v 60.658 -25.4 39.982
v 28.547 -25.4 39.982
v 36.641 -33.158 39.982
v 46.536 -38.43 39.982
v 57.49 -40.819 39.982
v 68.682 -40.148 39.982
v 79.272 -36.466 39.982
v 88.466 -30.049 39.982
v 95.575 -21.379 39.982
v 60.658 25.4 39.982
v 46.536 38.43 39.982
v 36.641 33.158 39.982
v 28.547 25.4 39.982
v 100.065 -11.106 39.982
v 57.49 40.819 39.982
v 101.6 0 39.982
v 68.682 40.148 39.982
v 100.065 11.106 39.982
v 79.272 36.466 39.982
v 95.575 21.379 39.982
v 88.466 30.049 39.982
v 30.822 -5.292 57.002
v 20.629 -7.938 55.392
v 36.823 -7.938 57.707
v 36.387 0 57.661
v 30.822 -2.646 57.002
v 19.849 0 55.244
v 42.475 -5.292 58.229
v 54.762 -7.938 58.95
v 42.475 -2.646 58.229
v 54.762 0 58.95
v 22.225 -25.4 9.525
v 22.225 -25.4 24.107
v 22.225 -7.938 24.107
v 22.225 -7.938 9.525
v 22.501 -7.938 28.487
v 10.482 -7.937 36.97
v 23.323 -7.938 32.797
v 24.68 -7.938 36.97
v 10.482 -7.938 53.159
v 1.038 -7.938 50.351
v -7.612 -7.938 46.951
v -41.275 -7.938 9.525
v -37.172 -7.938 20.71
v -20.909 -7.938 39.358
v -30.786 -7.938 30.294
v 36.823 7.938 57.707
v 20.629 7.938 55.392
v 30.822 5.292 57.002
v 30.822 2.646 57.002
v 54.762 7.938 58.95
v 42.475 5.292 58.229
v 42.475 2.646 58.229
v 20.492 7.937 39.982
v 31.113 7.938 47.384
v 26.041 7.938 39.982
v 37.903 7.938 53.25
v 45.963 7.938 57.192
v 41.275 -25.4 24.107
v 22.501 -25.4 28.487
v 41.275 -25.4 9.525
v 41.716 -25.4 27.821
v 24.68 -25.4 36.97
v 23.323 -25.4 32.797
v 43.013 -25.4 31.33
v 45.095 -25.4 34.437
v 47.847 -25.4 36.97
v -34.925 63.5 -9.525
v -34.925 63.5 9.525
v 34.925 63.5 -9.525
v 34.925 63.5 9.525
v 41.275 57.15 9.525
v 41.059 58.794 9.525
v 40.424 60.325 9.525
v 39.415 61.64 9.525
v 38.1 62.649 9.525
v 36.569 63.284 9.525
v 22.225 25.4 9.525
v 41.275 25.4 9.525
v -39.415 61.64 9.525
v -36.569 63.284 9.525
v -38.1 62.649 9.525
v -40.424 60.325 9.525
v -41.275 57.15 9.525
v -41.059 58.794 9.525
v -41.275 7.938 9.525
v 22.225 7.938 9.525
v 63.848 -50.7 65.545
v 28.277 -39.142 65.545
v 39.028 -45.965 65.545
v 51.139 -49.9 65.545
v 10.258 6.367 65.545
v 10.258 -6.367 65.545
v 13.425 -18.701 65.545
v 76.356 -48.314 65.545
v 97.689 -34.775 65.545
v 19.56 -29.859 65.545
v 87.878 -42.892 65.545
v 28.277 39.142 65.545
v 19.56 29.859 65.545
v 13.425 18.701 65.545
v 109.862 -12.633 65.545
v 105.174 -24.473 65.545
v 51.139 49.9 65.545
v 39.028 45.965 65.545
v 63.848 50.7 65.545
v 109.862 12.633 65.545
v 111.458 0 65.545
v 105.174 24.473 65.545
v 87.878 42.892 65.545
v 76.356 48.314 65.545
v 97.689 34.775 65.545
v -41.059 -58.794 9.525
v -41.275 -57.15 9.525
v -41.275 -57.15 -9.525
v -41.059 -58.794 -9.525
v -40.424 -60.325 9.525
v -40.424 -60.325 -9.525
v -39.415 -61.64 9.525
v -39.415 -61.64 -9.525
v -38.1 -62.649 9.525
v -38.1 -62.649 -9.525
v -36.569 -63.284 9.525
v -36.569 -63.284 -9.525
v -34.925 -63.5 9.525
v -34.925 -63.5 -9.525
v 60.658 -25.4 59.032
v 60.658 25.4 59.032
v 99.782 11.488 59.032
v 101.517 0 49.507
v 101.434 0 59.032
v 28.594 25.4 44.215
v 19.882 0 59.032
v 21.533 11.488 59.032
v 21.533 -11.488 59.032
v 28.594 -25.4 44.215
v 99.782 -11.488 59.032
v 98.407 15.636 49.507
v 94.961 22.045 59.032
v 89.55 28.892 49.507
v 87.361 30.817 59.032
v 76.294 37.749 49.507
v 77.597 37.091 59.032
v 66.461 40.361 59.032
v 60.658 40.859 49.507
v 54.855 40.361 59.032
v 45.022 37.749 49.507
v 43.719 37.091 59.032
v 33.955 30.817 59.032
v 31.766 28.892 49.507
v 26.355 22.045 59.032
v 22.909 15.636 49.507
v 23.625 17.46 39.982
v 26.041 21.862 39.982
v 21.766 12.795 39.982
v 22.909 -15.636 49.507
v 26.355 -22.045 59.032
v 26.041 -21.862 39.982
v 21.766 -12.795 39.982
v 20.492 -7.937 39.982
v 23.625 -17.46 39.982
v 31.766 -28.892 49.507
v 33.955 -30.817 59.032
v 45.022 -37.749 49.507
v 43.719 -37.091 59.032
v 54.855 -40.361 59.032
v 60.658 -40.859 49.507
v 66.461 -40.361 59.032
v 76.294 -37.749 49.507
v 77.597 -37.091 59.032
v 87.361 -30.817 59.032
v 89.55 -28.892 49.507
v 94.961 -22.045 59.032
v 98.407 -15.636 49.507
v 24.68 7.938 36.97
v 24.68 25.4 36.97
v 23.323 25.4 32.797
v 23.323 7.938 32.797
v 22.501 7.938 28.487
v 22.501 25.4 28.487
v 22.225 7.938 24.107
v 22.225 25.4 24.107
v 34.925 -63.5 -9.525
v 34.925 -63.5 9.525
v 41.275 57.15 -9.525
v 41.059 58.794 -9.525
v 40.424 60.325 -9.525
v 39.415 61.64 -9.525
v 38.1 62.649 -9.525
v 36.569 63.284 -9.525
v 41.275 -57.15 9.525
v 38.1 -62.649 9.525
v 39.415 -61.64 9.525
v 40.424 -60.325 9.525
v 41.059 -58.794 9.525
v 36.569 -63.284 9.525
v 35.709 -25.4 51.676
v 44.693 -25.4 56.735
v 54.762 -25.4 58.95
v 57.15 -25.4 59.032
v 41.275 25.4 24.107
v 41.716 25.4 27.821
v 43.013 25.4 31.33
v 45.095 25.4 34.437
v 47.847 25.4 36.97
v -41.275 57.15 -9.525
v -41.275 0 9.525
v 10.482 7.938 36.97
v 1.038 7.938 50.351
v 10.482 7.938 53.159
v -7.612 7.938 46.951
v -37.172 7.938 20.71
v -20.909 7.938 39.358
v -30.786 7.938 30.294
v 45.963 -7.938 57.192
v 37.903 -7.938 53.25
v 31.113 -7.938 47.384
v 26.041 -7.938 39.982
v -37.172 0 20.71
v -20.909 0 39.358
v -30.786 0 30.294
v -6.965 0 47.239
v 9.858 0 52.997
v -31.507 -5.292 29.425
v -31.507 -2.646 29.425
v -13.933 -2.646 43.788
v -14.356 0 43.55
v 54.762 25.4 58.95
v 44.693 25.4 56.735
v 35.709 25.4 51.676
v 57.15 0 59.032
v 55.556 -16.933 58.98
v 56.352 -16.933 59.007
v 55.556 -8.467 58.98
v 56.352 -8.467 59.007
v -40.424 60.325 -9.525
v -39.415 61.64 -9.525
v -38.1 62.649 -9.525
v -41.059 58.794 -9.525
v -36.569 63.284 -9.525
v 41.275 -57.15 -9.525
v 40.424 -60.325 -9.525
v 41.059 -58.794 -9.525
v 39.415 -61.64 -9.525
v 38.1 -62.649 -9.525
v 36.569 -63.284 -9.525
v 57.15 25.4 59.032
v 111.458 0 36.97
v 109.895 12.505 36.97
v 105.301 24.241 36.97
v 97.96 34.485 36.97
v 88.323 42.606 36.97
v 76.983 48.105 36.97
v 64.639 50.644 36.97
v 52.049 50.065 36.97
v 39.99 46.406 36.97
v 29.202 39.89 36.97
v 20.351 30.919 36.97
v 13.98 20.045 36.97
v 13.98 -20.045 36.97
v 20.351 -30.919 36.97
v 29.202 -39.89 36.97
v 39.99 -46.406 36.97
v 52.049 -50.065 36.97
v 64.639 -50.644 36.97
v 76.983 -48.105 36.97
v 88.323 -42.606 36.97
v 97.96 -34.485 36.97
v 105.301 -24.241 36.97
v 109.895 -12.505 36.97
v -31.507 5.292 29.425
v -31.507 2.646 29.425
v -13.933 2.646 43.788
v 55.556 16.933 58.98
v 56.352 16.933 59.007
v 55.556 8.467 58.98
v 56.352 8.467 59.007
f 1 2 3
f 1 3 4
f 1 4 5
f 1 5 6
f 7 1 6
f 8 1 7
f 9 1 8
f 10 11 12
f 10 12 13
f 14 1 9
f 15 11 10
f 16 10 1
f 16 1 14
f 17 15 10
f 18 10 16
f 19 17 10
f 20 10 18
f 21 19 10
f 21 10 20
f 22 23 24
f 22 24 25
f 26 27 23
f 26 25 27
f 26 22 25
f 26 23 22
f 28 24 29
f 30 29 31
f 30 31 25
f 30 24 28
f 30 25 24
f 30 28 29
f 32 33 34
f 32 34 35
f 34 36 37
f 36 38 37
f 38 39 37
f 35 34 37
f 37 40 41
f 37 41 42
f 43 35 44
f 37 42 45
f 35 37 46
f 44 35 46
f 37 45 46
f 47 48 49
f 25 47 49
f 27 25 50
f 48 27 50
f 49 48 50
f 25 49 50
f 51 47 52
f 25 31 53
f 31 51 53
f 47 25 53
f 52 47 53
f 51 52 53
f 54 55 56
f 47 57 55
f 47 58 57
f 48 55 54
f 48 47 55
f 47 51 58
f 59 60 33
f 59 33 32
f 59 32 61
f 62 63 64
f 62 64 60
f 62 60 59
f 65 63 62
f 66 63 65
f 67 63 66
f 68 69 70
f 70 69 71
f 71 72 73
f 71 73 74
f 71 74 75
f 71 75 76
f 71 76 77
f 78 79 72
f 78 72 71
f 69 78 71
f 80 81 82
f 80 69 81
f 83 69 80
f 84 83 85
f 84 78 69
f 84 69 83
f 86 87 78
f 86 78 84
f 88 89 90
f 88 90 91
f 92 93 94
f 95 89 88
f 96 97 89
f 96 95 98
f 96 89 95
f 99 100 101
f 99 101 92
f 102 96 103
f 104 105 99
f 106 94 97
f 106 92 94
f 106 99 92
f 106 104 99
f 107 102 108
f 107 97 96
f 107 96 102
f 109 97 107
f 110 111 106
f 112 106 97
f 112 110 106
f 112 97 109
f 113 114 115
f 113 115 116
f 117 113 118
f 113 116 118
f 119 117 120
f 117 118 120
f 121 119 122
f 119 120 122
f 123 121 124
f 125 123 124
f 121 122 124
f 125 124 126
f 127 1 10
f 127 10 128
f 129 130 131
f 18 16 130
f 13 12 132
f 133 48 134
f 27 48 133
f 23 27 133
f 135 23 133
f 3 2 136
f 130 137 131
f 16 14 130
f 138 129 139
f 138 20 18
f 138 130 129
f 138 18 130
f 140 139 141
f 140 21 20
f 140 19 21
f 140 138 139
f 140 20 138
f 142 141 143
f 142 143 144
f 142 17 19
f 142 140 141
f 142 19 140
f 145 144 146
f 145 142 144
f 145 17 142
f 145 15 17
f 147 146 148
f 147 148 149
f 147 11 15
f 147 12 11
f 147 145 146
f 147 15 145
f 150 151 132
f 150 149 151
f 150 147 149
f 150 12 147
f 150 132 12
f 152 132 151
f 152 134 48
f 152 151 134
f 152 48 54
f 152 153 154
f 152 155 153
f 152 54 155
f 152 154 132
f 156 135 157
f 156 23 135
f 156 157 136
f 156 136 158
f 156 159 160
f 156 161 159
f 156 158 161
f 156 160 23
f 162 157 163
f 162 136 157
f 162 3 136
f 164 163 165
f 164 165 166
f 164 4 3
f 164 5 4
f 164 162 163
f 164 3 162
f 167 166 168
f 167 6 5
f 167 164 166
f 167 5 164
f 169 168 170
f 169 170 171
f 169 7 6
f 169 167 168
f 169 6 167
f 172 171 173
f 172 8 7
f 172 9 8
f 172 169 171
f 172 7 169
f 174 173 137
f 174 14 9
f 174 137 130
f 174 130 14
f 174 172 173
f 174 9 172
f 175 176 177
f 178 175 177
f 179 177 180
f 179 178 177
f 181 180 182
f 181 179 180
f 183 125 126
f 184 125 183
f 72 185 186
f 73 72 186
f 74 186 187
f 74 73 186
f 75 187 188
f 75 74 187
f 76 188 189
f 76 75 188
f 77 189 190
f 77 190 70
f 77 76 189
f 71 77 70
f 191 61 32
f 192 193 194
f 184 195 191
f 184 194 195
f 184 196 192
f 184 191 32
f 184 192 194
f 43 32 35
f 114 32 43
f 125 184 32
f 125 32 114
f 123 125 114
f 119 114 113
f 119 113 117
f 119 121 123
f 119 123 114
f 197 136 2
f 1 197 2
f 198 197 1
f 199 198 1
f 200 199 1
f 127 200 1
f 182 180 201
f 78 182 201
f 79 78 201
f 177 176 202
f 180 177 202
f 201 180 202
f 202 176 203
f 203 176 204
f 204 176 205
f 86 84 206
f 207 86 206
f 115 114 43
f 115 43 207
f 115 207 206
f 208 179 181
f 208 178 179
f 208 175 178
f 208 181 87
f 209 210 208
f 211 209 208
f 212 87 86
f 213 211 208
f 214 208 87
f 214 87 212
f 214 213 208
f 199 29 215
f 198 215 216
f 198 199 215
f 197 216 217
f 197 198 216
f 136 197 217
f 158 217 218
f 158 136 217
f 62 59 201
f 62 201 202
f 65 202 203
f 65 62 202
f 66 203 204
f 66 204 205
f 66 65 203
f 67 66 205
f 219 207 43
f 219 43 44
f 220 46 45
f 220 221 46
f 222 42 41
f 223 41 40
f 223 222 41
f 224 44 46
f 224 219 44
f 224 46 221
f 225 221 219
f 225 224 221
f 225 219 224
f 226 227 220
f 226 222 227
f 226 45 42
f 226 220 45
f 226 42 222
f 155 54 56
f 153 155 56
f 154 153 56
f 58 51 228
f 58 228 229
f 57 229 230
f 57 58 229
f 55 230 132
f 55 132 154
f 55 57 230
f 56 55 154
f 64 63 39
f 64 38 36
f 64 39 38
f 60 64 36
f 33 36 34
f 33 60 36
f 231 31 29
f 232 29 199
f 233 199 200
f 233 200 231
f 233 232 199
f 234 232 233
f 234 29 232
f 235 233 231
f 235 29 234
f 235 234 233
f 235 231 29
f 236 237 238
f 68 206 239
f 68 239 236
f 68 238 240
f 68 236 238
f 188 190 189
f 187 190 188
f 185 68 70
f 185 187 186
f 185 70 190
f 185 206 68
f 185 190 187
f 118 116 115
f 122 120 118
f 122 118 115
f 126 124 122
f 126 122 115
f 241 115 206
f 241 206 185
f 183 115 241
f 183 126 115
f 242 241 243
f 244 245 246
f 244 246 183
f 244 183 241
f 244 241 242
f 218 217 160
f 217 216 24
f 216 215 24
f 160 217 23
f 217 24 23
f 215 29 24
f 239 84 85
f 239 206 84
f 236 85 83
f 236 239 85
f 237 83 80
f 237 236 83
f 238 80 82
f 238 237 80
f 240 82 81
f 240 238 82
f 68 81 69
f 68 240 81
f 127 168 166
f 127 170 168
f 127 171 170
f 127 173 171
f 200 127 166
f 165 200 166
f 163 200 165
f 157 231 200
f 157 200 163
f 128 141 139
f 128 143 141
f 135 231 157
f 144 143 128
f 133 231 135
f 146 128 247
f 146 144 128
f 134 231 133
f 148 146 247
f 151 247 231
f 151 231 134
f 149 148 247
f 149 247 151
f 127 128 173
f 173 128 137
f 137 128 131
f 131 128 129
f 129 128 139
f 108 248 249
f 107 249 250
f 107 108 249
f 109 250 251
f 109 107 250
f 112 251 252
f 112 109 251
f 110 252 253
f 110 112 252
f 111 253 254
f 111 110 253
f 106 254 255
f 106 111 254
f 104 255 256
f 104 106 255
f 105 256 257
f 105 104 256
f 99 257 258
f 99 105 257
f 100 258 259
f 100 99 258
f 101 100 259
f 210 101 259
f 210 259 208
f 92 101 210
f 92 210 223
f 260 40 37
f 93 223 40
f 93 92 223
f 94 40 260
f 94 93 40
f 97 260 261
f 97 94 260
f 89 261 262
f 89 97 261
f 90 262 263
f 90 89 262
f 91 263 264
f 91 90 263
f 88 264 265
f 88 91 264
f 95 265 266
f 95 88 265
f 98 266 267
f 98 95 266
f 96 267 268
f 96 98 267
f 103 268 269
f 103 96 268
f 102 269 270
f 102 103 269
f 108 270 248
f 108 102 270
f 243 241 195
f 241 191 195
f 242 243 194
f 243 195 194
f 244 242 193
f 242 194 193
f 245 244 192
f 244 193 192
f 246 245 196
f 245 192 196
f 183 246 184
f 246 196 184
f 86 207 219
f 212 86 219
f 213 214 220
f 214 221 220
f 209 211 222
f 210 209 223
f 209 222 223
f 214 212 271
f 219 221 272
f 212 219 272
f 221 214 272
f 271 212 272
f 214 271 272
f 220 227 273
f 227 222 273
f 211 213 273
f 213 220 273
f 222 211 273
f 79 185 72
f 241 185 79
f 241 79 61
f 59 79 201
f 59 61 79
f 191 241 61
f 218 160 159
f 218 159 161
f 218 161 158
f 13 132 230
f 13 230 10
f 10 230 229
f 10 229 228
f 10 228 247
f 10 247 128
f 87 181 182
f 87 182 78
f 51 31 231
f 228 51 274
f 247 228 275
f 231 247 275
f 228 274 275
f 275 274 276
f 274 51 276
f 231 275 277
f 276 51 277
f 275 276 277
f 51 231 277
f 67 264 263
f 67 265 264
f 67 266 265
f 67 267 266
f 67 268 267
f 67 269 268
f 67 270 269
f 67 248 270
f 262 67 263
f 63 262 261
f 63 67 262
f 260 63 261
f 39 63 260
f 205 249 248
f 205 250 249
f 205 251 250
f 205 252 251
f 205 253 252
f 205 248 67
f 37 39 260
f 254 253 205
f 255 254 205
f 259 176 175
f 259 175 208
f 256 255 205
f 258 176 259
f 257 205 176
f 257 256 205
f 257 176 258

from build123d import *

# Parameters (mm, degrees)
F1_DEPTH = 63.5
F2_DEPTH = 25.4
F3_DEPTH = 7.9375
F5_R     = 6.35


with BuildPart() as f1:
    # F0 (on Front) → F1 (new body, symmetric)
    with BuildSketch(Plane.XZ):
        Polygon((22.225, 9.525), (-41.275, 9.525), (-41.275, -9.525), (41.275, -9.525), (41.275, 9.525), align=None)
    extrude(amount=F1_DEPTH, both=True)

    # F0 (on Front) → F2 (join, symmetric)
    with BuildSketch(Plane.XZ):
        with BuildLine():
            Line((22.225, 24.107097), (22.225, 9.525))
            Line((22.225, 9.525), (41.275, 9.525))
            Line((41.275, 9.525), (41.275, 24.107097))
            ThreePointArc((41.275, 24.107097), (45.92468, 35.332417), (57.15, 39.982097))
            Line((57.15, 39.982097), (60.657849, 39.982097))
            Line((60.657849, 39.982097), (60.657849, 59.032097))
            Line((60.657849, 59.032097), (57.15, 59.032097))
            add(Edge.make_bspline(
                [(54.762262, 58.950379), (55.554692, 58.980457), (56.350621, 59.007687), (57.15, 59.032097)],
                knots=[108.497511, 108.497511, 108.497511, 108.497511, 110.174558, 110.174558, 110.174558, 110.174558], degree=3))
            ThreePointArc((54.762262, 58.950379), (31.624059, 47.943664), (22.225, 24.107097))
        make_face()
    extrude(amount=F2_DEPTH, both=True)

    # F0 (on Front) → F3 (join, symmetric)
    with BuildSketch(Plane.XZ):
        with BuildLine():
            add(Edge.make_bspline(
                [(-41.275, 9.525), (-33.121447, 43.135956), (3.4956, 57.004461), (54.762262, 58.950379)],
                knots=[0, 0, 0, 0, 108.497511, 108.497511, 108.497511, 108.497511], degree=3))
            Line((-41.275, 9.525), (22.225, 9.525))
            Line((22.225, 9.525), (22.225, 24.107097))
            ThreePointArc((22.225, 24.107097), (31.624059, 47.943664), (54.762262, 58.950379))
        make_face()
    extrude(amount=F3_DEPTH, both=True)

    # F0 (on Front) → F4 (revolve)
    with BuildSketch(Plane.XZ):
        Polygon((60.657849, 65.545457), (60.657849, 59.032097), (101.433977, 59.032097), (101.6, 39.982097), (60.657849, 39.982097), (60.657849, 36.970457), (111.457849, 36.970457), (111.457849, 65.545457), align=None)
    revolve(axis=Axis((60.657849, 0, 51.257957), (0, 0, 1)))

    # F5
    f5_edges = [f1.edges().sort_by_distance(p)[0] for p in [
        (41.275, -63.5, 0),
        (-41.275, -63.5, 0),
        (41.275, 63.5, 0),
        (-41.275, 63.5, 0),
    ]]
    fillet(f5_edges, radius=F5_R)


solid = f1.part
